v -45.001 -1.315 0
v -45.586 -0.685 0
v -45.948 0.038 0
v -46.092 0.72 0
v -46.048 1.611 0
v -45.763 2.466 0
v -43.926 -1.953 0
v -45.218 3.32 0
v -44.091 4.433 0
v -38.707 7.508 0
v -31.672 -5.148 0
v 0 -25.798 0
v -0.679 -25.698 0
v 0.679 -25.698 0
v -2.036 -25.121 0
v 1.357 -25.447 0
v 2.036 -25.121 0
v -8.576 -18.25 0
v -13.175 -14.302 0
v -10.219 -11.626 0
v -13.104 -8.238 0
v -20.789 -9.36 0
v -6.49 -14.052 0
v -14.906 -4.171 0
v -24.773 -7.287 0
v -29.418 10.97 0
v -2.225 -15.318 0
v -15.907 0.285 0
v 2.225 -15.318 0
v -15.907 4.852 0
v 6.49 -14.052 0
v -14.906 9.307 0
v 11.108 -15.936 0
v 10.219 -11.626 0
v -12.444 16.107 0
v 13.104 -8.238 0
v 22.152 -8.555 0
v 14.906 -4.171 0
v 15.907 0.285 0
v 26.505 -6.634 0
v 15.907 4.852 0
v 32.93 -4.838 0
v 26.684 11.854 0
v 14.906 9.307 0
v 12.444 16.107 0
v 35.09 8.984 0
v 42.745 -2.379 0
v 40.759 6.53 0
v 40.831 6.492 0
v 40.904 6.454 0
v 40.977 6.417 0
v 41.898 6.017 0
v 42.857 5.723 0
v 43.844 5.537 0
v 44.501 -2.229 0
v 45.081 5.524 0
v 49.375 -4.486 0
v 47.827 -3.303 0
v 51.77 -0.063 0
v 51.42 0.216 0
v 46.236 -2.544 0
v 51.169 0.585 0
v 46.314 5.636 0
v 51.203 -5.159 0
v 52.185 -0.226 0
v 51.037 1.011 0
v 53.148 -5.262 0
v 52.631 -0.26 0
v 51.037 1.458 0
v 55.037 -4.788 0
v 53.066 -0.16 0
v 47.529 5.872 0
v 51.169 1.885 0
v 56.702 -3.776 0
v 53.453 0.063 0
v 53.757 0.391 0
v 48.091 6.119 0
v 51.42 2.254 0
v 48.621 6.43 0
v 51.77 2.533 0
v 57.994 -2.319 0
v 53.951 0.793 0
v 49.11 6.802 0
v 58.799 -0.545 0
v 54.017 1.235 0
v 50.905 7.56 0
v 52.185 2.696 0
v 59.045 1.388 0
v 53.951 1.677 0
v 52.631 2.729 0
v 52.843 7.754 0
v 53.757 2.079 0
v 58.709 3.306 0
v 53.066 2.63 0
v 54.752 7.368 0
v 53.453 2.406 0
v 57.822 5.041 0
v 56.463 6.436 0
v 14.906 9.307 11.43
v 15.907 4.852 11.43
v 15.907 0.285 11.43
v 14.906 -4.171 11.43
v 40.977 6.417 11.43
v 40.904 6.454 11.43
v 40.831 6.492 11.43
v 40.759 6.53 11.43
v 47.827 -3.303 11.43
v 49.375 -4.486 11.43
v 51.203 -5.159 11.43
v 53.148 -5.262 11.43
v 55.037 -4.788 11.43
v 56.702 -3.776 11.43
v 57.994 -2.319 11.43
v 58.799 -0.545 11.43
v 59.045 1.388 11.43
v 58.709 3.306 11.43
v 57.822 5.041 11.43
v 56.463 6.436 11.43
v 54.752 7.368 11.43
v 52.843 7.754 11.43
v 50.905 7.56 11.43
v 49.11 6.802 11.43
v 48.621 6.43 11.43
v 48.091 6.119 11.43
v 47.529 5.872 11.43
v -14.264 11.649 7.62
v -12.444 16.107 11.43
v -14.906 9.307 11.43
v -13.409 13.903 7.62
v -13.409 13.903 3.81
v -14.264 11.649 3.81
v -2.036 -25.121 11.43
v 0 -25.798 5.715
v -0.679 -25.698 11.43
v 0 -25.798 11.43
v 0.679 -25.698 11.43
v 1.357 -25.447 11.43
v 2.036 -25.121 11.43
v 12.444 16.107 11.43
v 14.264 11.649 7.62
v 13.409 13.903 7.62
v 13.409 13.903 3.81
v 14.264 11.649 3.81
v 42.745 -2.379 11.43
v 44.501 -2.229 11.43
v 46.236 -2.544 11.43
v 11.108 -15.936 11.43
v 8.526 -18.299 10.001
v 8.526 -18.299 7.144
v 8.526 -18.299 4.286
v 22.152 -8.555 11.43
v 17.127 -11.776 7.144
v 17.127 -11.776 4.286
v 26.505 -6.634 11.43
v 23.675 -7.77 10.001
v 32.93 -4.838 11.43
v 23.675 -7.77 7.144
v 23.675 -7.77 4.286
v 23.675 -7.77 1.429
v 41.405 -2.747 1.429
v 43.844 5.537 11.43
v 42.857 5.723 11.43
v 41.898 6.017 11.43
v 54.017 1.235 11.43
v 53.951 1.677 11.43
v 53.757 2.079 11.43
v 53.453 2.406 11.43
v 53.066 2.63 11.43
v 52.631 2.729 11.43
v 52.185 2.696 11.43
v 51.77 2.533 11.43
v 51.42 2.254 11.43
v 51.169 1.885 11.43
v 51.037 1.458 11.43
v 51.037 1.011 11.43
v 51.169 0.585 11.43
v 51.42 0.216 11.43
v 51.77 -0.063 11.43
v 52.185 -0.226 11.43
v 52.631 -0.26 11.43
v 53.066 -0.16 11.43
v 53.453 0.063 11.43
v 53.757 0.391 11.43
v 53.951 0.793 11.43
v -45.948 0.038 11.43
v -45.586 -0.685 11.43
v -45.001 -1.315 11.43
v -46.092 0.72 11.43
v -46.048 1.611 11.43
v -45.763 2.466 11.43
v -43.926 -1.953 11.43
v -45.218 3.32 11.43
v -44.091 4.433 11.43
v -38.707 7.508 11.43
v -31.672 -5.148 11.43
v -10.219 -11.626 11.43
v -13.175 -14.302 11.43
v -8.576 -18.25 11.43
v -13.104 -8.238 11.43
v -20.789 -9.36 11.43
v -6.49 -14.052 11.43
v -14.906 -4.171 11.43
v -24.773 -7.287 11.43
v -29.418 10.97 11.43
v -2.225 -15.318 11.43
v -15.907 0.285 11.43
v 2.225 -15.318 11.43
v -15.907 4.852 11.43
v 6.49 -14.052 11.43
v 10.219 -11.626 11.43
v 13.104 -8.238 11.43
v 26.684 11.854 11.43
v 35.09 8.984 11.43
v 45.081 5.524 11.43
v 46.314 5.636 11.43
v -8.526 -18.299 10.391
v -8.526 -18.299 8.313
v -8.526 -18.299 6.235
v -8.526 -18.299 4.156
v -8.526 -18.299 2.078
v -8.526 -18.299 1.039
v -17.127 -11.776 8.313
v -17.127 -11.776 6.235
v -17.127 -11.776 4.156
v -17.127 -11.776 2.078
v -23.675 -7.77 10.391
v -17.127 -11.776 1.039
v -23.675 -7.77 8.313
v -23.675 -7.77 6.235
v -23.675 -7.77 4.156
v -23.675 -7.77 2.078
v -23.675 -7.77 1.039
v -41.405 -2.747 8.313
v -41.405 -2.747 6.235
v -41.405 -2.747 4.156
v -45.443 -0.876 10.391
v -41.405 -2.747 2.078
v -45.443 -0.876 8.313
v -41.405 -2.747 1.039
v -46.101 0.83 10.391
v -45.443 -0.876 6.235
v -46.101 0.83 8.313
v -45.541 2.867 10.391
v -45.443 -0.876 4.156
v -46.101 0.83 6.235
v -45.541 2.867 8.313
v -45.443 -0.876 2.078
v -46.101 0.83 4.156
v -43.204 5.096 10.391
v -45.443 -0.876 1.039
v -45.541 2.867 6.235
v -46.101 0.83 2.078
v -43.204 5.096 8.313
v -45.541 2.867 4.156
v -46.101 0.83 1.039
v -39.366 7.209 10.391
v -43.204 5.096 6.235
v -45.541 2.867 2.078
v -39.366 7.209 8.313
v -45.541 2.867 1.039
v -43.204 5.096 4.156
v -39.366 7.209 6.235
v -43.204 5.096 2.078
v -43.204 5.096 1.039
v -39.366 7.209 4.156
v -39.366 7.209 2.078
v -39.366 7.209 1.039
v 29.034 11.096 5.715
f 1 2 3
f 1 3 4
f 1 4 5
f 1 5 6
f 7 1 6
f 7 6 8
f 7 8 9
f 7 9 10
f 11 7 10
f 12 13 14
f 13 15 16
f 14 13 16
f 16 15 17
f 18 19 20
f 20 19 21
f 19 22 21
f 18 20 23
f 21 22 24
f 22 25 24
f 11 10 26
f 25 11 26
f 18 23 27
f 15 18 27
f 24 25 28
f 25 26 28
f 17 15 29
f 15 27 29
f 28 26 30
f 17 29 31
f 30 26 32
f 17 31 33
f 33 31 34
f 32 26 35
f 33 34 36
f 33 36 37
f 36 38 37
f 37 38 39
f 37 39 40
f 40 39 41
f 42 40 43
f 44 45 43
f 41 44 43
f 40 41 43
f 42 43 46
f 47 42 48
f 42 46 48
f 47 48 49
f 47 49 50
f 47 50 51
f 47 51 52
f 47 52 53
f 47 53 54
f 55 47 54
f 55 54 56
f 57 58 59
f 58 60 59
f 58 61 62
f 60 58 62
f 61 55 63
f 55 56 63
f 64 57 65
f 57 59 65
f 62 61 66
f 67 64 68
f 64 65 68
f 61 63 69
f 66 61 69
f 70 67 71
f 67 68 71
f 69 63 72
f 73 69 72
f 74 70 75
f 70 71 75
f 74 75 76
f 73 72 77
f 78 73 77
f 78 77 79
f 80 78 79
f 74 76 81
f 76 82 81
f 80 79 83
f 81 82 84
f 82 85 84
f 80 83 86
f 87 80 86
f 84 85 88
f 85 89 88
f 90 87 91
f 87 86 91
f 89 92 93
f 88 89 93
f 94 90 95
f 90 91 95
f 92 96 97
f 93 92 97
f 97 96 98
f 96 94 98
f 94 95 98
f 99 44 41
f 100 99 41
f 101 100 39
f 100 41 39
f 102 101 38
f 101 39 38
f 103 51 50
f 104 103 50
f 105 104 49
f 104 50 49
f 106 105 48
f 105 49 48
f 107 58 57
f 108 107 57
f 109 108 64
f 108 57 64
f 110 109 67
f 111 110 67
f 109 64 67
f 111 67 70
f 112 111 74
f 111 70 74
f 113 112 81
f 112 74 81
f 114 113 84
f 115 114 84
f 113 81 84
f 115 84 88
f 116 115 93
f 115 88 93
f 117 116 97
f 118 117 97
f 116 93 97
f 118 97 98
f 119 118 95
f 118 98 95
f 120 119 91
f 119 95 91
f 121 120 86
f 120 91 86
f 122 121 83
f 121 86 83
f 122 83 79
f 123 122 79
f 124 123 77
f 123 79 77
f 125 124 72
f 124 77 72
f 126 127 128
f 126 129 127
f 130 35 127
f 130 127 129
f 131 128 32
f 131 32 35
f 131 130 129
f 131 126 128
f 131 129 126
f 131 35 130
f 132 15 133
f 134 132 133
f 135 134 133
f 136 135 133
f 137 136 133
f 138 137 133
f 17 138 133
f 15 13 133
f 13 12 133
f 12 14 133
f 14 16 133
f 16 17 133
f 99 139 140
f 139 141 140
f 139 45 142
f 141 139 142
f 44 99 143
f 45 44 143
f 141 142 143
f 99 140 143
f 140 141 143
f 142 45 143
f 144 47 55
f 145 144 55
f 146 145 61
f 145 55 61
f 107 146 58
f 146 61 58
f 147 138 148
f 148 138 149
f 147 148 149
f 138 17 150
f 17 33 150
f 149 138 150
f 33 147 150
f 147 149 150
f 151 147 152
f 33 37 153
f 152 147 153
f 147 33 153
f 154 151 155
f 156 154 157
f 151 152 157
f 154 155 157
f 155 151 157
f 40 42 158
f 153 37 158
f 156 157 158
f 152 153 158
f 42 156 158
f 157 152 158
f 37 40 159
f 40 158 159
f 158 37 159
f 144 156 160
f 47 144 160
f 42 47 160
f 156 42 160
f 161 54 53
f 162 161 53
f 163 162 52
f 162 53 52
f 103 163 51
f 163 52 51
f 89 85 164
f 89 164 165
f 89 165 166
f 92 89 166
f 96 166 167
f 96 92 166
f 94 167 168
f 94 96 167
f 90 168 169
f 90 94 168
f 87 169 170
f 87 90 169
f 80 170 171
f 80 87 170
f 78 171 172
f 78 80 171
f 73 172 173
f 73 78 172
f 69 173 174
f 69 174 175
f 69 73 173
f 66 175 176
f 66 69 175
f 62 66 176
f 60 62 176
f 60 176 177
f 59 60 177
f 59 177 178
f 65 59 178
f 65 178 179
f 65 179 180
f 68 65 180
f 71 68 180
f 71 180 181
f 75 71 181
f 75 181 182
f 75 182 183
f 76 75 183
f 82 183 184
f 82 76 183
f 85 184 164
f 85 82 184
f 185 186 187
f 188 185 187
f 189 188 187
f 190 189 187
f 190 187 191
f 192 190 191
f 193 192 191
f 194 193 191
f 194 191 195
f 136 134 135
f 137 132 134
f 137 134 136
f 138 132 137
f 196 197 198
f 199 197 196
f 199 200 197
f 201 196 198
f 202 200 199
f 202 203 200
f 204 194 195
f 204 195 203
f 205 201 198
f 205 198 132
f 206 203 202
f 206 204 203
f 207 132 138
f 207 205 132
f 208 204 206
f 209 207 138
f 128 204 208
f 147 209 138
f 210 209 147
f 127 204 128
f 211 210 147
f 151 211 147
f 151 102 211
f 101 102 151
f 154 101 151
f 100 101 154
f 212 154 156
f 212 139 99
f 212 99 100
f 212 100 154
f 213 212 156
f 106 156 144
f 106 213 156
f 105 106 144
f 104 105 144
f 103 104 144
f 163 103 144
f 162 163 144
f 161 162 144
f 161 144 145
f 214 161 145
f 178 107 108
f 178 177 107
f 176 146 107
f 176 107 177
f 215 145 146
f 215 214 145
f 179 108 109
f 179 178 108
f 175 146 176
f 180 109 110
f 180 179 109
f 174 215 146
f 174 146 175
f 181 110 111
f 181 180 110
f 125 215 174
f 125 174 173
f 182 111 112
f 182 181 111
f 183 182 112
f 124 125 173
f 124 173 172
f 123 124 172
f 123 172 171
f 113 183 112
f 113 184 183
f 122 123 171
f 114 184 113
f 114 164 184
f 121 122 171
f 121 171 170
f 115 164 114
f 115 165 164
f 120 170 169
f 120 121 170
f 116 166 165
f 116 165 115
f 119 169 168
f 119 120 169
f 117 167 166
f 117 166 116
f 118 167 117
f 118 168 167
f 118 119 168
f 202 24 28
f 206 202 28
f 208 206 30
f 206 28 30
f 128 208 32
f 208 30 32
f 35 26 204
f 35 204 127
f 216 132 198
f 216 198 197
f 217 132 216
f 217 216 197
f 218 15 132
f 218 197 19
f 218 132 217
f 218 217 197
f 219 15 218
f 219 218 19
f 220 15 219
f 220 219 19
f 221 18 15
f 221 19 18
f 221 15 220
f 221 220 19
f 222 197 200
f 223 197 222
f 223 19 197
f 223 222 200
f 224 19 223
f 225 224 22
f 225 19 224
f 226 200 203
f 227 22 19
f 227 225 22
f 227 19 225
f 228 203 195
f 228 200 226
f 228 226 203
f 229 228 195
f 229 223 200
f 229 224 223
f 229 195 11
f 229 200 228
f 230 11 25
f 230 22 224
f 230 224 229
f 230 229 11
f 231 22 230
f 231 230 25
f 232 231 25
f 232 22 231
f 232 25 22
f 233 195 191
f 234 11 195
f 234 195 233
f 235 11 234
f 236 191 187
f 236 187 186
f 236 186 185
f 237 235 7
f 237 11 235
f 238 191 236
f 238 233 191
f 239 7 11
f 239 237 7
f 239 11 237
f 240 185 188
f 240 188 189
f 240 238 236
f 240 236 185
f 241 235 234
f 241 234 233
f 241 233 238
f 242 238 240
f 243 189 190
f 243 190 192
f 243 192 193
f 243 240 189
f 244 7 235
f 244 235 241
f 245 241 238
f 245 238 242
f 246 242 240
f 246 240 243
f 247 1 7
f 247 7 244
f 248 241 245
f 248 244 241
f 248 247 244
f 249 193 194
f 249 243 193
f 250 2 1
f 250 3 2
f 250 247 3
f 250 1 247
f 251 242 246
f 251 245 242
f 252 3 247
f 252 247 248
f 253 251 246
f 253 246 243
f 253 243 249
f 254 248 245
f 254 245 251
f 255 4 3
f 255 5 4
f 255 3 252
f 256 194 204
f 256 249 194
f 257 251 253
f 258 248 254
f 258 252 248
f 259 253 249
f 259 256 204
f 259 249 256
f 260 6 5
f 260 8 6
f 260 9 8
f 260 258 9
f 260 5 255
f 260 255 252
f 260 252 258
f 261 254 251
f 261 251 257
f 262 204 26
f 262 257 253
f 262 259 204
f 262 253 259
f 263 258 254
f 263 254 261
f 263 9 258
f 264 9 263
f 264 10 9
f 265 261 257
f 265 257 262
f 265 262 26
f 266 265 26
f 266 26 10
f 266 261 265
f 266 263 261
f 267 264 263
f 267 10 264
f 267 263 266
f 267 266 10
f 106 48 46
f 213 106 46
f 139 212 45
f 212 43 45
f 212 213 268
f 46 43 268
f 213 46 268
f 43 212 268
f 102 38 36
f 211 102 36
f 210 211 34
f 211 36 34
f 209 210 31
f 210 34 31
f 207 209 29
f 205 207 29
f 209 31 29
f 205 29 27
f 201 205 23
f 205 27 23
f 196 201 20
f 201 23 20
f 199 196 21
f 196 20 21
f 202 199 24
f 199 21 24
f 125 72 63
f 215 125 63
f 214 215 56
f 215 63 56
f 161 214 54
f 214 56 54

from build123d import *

# Parameters (mm, degrees)
F0_R     = 1.4985630317
F1_DEPTH = 11.43


with BuildPart() as f1:
    # F0 (on Top) → F1 (new body)
    with BuildSketch(Plane.XY):
        with BuildLine():
            add(Edge.make_bspline(
                [(-2.0359231176, -25.1206368319), (-1.3572468606, -25.4594553442), (0, -26.1375400989), (1.3572468606, -25.4594553442), (2.0359231176, -25.1206368319)],
                knots=[0, 0, 0, 0, 0.5, 1, 1, 1, 1], degree=3))
            add(Edge.make_bspline(
                [(2.0359231176, -25.1206368319), (3.3457383083, -23.7289975008), (5.9176088554, -20.9942341783), (8.3825547389, -18.3420624619), (12.9862326993, -14.1723402798), (17.2483349718, -11.8697604881), (23.5822979488, -7.1258779534), (33.3196303031, -4.7357772117), (39.6236724826, -3.217253521), (42.3201246069, -2.5082482566), (42.7449258083, -2.3794347429)],
                knots=[0.0267318689, 0.0267318689, 0.0267318689, 0.0267318689, 0.0793940725, 0.1368856043, 0.2045627996, 0.2663300013, 0.3434968825, 0.4325298389, 0.5123744144, 0.5283607708, 0.5283607708, 0.5283607708, 0.5283607708], degree=3))
            add(Edge.make_bspline(
                [(42.7449258083, -2.3794347429), (43.8815731542, -2.0347663711), (46.045577935, -1.0853188279), (46.5822686786, 2.7847802254), (43.1373679174, 5.284193473), (40.9767322457, 6.4169524924)],
                knots=[0.5283607708, 0.5283607708, 0.5283607708, 0.5283607708, 0.5711357195, 0.6250302421, 0.6734394222, 0.6734394222, 0.6734394222, 0.6734394222], degree=3))
            ThreePointArc((40.9767322457, 6.4169524924), (40.8675160296, 6.4727238237), (40.7590710313, 6.5299803131))
            add(Edge.make_bspline(
                [(40.7590710313, 6.5299803131), (37.6023937497, 8.1537861369), (27.6170269646, 11.7427429089), (17.0369422947, 14.7816914556), (12.4444465447, 16.107118844)],
                knots=[0.6750518947, 0.6750518947, 0.6750518947, 0.6750518947, 0.7446505875, 0.8393118979, 0.8393118979, 0.8393118979, 0.8393118979], degree=3))
            add(Edge.make_bspline(
                [(12.4444465447, 16.107118844), (13.4288124201, 13.9138079535), (14.405733434, 11.706479395), (14.9060189724, 9.307032451)],
                knots=[0, 0, 0, 0, 0.4869217945, 0.4869217945, 0.4869217945, 0.4869217945], degree=3))
            ThreePointArc((14.9060189724, 9.307032451), (16.033692156, 2.5682199114), (14.9060189724, -4.1705926282))
            ThreePointArc((14.9060189724, -4.1705926282), (0, -15.4784768138), (-14.9060189724, -4.1705926282))
            ThreePointArc((-14.9060189724, -4.1705926282), (-16.033692156, 2.5682199114), (-14.9060189724, 9.307032451))
            add(Edge.make_bspline(
                [(-12.4444465447, 16.107118844), (-13.4288124201, 13.9138079535), (-14.405733434, 11.706479395), (-14.9060189724, 9.307032451)],
                knots=[0, 0, 0, 0, 0.4869217945, 0.4869217945, 0.4869217945, 0.4869217945], degree=3))
            add(Edge.make_bspline(
                [(-2.0359231176, -25.1206368319), (-3.3457383083, -23.7289975008), (-5.9176088554, -20.9942341783), (-8.3825547389, -18.3420624619), (-12.9862326993, -14.1723402798), (-17.2483349718, -11.8697604881), (-23.5822979488, -7.1258779534), (-33.3196303031, -4.7357772117), (-41.0823407103, -2.8658881275), (-45.9864394649, -1.5117687719), (-46.8457007748, 4.6843999202), (-30.8389514135, 10.8173001618), (-17.0369422947, 14.7816914556), (-12.4444465447, 16.107118844)],
                knots=[0.0267318689, 0.0267318689, 0.0267318689, 0.0267318689, 0.0793940725, 0.1368856043, 0.2045627996, 0.2663300013, 0.3434968825, 0.4325298389, 0.5123744144, 0.5711357195, 0.6250302421, 0.7446505875, 0.8393118979, 0.8393118979, 0.8393118979, 0.8393118979], degree=3))
        make_face()
        with BuildLine():
            add(Edge.make_bspline(
                [(42.7449258083, -2.3794347429), (43.8815731542, -2.0347663711), (46.045577935, -1.0853188279), (46.5822686786, 2.7847802254), (43.1373679174, 5.284193473), (40.9767322457, 6.4169524924)],
                knots=[0.5283607708, 0.5283607708, 0.5283607708, 0.5283607708, 0.5711357195, 0.6250302421, 0.6734394222, 0.6734394222, 0.6734394222, 0.6734394222], degree=3))
            ThreePointArc((42.7449258083, -2.3794347429), (45.378860283, -2.3288884868), (47.8265587579, -3.3030229318))
            ThreePointArc((47.8265587579, -3.3030229318), (58.9944758829, 0.412176161), (49.1102670664, 6.8018156877))
            ThreePointArc((49.1102670664, 6.8018156877), (48.3608651105, 6.266695872), (47.5288443445, 5.8721100719))
            ThreePointArc((47.5288443445, 5.8721100719), (45.6991604767, 5.5642789991), (43.843957286, 5.5373690255))
            ThreePointArc((43.843957286, 5.5373690255), (42.3733924319, 5.8567052695), (40.9767322457, 6.4169524924))
        make_face()
        with Locations((52.5188855827, 1.2348284946)):
            Circle(F0_R, mode=Mode.SUBTRACT)
    extrude(amount=F1_DEPTH)


solid = f1.part
